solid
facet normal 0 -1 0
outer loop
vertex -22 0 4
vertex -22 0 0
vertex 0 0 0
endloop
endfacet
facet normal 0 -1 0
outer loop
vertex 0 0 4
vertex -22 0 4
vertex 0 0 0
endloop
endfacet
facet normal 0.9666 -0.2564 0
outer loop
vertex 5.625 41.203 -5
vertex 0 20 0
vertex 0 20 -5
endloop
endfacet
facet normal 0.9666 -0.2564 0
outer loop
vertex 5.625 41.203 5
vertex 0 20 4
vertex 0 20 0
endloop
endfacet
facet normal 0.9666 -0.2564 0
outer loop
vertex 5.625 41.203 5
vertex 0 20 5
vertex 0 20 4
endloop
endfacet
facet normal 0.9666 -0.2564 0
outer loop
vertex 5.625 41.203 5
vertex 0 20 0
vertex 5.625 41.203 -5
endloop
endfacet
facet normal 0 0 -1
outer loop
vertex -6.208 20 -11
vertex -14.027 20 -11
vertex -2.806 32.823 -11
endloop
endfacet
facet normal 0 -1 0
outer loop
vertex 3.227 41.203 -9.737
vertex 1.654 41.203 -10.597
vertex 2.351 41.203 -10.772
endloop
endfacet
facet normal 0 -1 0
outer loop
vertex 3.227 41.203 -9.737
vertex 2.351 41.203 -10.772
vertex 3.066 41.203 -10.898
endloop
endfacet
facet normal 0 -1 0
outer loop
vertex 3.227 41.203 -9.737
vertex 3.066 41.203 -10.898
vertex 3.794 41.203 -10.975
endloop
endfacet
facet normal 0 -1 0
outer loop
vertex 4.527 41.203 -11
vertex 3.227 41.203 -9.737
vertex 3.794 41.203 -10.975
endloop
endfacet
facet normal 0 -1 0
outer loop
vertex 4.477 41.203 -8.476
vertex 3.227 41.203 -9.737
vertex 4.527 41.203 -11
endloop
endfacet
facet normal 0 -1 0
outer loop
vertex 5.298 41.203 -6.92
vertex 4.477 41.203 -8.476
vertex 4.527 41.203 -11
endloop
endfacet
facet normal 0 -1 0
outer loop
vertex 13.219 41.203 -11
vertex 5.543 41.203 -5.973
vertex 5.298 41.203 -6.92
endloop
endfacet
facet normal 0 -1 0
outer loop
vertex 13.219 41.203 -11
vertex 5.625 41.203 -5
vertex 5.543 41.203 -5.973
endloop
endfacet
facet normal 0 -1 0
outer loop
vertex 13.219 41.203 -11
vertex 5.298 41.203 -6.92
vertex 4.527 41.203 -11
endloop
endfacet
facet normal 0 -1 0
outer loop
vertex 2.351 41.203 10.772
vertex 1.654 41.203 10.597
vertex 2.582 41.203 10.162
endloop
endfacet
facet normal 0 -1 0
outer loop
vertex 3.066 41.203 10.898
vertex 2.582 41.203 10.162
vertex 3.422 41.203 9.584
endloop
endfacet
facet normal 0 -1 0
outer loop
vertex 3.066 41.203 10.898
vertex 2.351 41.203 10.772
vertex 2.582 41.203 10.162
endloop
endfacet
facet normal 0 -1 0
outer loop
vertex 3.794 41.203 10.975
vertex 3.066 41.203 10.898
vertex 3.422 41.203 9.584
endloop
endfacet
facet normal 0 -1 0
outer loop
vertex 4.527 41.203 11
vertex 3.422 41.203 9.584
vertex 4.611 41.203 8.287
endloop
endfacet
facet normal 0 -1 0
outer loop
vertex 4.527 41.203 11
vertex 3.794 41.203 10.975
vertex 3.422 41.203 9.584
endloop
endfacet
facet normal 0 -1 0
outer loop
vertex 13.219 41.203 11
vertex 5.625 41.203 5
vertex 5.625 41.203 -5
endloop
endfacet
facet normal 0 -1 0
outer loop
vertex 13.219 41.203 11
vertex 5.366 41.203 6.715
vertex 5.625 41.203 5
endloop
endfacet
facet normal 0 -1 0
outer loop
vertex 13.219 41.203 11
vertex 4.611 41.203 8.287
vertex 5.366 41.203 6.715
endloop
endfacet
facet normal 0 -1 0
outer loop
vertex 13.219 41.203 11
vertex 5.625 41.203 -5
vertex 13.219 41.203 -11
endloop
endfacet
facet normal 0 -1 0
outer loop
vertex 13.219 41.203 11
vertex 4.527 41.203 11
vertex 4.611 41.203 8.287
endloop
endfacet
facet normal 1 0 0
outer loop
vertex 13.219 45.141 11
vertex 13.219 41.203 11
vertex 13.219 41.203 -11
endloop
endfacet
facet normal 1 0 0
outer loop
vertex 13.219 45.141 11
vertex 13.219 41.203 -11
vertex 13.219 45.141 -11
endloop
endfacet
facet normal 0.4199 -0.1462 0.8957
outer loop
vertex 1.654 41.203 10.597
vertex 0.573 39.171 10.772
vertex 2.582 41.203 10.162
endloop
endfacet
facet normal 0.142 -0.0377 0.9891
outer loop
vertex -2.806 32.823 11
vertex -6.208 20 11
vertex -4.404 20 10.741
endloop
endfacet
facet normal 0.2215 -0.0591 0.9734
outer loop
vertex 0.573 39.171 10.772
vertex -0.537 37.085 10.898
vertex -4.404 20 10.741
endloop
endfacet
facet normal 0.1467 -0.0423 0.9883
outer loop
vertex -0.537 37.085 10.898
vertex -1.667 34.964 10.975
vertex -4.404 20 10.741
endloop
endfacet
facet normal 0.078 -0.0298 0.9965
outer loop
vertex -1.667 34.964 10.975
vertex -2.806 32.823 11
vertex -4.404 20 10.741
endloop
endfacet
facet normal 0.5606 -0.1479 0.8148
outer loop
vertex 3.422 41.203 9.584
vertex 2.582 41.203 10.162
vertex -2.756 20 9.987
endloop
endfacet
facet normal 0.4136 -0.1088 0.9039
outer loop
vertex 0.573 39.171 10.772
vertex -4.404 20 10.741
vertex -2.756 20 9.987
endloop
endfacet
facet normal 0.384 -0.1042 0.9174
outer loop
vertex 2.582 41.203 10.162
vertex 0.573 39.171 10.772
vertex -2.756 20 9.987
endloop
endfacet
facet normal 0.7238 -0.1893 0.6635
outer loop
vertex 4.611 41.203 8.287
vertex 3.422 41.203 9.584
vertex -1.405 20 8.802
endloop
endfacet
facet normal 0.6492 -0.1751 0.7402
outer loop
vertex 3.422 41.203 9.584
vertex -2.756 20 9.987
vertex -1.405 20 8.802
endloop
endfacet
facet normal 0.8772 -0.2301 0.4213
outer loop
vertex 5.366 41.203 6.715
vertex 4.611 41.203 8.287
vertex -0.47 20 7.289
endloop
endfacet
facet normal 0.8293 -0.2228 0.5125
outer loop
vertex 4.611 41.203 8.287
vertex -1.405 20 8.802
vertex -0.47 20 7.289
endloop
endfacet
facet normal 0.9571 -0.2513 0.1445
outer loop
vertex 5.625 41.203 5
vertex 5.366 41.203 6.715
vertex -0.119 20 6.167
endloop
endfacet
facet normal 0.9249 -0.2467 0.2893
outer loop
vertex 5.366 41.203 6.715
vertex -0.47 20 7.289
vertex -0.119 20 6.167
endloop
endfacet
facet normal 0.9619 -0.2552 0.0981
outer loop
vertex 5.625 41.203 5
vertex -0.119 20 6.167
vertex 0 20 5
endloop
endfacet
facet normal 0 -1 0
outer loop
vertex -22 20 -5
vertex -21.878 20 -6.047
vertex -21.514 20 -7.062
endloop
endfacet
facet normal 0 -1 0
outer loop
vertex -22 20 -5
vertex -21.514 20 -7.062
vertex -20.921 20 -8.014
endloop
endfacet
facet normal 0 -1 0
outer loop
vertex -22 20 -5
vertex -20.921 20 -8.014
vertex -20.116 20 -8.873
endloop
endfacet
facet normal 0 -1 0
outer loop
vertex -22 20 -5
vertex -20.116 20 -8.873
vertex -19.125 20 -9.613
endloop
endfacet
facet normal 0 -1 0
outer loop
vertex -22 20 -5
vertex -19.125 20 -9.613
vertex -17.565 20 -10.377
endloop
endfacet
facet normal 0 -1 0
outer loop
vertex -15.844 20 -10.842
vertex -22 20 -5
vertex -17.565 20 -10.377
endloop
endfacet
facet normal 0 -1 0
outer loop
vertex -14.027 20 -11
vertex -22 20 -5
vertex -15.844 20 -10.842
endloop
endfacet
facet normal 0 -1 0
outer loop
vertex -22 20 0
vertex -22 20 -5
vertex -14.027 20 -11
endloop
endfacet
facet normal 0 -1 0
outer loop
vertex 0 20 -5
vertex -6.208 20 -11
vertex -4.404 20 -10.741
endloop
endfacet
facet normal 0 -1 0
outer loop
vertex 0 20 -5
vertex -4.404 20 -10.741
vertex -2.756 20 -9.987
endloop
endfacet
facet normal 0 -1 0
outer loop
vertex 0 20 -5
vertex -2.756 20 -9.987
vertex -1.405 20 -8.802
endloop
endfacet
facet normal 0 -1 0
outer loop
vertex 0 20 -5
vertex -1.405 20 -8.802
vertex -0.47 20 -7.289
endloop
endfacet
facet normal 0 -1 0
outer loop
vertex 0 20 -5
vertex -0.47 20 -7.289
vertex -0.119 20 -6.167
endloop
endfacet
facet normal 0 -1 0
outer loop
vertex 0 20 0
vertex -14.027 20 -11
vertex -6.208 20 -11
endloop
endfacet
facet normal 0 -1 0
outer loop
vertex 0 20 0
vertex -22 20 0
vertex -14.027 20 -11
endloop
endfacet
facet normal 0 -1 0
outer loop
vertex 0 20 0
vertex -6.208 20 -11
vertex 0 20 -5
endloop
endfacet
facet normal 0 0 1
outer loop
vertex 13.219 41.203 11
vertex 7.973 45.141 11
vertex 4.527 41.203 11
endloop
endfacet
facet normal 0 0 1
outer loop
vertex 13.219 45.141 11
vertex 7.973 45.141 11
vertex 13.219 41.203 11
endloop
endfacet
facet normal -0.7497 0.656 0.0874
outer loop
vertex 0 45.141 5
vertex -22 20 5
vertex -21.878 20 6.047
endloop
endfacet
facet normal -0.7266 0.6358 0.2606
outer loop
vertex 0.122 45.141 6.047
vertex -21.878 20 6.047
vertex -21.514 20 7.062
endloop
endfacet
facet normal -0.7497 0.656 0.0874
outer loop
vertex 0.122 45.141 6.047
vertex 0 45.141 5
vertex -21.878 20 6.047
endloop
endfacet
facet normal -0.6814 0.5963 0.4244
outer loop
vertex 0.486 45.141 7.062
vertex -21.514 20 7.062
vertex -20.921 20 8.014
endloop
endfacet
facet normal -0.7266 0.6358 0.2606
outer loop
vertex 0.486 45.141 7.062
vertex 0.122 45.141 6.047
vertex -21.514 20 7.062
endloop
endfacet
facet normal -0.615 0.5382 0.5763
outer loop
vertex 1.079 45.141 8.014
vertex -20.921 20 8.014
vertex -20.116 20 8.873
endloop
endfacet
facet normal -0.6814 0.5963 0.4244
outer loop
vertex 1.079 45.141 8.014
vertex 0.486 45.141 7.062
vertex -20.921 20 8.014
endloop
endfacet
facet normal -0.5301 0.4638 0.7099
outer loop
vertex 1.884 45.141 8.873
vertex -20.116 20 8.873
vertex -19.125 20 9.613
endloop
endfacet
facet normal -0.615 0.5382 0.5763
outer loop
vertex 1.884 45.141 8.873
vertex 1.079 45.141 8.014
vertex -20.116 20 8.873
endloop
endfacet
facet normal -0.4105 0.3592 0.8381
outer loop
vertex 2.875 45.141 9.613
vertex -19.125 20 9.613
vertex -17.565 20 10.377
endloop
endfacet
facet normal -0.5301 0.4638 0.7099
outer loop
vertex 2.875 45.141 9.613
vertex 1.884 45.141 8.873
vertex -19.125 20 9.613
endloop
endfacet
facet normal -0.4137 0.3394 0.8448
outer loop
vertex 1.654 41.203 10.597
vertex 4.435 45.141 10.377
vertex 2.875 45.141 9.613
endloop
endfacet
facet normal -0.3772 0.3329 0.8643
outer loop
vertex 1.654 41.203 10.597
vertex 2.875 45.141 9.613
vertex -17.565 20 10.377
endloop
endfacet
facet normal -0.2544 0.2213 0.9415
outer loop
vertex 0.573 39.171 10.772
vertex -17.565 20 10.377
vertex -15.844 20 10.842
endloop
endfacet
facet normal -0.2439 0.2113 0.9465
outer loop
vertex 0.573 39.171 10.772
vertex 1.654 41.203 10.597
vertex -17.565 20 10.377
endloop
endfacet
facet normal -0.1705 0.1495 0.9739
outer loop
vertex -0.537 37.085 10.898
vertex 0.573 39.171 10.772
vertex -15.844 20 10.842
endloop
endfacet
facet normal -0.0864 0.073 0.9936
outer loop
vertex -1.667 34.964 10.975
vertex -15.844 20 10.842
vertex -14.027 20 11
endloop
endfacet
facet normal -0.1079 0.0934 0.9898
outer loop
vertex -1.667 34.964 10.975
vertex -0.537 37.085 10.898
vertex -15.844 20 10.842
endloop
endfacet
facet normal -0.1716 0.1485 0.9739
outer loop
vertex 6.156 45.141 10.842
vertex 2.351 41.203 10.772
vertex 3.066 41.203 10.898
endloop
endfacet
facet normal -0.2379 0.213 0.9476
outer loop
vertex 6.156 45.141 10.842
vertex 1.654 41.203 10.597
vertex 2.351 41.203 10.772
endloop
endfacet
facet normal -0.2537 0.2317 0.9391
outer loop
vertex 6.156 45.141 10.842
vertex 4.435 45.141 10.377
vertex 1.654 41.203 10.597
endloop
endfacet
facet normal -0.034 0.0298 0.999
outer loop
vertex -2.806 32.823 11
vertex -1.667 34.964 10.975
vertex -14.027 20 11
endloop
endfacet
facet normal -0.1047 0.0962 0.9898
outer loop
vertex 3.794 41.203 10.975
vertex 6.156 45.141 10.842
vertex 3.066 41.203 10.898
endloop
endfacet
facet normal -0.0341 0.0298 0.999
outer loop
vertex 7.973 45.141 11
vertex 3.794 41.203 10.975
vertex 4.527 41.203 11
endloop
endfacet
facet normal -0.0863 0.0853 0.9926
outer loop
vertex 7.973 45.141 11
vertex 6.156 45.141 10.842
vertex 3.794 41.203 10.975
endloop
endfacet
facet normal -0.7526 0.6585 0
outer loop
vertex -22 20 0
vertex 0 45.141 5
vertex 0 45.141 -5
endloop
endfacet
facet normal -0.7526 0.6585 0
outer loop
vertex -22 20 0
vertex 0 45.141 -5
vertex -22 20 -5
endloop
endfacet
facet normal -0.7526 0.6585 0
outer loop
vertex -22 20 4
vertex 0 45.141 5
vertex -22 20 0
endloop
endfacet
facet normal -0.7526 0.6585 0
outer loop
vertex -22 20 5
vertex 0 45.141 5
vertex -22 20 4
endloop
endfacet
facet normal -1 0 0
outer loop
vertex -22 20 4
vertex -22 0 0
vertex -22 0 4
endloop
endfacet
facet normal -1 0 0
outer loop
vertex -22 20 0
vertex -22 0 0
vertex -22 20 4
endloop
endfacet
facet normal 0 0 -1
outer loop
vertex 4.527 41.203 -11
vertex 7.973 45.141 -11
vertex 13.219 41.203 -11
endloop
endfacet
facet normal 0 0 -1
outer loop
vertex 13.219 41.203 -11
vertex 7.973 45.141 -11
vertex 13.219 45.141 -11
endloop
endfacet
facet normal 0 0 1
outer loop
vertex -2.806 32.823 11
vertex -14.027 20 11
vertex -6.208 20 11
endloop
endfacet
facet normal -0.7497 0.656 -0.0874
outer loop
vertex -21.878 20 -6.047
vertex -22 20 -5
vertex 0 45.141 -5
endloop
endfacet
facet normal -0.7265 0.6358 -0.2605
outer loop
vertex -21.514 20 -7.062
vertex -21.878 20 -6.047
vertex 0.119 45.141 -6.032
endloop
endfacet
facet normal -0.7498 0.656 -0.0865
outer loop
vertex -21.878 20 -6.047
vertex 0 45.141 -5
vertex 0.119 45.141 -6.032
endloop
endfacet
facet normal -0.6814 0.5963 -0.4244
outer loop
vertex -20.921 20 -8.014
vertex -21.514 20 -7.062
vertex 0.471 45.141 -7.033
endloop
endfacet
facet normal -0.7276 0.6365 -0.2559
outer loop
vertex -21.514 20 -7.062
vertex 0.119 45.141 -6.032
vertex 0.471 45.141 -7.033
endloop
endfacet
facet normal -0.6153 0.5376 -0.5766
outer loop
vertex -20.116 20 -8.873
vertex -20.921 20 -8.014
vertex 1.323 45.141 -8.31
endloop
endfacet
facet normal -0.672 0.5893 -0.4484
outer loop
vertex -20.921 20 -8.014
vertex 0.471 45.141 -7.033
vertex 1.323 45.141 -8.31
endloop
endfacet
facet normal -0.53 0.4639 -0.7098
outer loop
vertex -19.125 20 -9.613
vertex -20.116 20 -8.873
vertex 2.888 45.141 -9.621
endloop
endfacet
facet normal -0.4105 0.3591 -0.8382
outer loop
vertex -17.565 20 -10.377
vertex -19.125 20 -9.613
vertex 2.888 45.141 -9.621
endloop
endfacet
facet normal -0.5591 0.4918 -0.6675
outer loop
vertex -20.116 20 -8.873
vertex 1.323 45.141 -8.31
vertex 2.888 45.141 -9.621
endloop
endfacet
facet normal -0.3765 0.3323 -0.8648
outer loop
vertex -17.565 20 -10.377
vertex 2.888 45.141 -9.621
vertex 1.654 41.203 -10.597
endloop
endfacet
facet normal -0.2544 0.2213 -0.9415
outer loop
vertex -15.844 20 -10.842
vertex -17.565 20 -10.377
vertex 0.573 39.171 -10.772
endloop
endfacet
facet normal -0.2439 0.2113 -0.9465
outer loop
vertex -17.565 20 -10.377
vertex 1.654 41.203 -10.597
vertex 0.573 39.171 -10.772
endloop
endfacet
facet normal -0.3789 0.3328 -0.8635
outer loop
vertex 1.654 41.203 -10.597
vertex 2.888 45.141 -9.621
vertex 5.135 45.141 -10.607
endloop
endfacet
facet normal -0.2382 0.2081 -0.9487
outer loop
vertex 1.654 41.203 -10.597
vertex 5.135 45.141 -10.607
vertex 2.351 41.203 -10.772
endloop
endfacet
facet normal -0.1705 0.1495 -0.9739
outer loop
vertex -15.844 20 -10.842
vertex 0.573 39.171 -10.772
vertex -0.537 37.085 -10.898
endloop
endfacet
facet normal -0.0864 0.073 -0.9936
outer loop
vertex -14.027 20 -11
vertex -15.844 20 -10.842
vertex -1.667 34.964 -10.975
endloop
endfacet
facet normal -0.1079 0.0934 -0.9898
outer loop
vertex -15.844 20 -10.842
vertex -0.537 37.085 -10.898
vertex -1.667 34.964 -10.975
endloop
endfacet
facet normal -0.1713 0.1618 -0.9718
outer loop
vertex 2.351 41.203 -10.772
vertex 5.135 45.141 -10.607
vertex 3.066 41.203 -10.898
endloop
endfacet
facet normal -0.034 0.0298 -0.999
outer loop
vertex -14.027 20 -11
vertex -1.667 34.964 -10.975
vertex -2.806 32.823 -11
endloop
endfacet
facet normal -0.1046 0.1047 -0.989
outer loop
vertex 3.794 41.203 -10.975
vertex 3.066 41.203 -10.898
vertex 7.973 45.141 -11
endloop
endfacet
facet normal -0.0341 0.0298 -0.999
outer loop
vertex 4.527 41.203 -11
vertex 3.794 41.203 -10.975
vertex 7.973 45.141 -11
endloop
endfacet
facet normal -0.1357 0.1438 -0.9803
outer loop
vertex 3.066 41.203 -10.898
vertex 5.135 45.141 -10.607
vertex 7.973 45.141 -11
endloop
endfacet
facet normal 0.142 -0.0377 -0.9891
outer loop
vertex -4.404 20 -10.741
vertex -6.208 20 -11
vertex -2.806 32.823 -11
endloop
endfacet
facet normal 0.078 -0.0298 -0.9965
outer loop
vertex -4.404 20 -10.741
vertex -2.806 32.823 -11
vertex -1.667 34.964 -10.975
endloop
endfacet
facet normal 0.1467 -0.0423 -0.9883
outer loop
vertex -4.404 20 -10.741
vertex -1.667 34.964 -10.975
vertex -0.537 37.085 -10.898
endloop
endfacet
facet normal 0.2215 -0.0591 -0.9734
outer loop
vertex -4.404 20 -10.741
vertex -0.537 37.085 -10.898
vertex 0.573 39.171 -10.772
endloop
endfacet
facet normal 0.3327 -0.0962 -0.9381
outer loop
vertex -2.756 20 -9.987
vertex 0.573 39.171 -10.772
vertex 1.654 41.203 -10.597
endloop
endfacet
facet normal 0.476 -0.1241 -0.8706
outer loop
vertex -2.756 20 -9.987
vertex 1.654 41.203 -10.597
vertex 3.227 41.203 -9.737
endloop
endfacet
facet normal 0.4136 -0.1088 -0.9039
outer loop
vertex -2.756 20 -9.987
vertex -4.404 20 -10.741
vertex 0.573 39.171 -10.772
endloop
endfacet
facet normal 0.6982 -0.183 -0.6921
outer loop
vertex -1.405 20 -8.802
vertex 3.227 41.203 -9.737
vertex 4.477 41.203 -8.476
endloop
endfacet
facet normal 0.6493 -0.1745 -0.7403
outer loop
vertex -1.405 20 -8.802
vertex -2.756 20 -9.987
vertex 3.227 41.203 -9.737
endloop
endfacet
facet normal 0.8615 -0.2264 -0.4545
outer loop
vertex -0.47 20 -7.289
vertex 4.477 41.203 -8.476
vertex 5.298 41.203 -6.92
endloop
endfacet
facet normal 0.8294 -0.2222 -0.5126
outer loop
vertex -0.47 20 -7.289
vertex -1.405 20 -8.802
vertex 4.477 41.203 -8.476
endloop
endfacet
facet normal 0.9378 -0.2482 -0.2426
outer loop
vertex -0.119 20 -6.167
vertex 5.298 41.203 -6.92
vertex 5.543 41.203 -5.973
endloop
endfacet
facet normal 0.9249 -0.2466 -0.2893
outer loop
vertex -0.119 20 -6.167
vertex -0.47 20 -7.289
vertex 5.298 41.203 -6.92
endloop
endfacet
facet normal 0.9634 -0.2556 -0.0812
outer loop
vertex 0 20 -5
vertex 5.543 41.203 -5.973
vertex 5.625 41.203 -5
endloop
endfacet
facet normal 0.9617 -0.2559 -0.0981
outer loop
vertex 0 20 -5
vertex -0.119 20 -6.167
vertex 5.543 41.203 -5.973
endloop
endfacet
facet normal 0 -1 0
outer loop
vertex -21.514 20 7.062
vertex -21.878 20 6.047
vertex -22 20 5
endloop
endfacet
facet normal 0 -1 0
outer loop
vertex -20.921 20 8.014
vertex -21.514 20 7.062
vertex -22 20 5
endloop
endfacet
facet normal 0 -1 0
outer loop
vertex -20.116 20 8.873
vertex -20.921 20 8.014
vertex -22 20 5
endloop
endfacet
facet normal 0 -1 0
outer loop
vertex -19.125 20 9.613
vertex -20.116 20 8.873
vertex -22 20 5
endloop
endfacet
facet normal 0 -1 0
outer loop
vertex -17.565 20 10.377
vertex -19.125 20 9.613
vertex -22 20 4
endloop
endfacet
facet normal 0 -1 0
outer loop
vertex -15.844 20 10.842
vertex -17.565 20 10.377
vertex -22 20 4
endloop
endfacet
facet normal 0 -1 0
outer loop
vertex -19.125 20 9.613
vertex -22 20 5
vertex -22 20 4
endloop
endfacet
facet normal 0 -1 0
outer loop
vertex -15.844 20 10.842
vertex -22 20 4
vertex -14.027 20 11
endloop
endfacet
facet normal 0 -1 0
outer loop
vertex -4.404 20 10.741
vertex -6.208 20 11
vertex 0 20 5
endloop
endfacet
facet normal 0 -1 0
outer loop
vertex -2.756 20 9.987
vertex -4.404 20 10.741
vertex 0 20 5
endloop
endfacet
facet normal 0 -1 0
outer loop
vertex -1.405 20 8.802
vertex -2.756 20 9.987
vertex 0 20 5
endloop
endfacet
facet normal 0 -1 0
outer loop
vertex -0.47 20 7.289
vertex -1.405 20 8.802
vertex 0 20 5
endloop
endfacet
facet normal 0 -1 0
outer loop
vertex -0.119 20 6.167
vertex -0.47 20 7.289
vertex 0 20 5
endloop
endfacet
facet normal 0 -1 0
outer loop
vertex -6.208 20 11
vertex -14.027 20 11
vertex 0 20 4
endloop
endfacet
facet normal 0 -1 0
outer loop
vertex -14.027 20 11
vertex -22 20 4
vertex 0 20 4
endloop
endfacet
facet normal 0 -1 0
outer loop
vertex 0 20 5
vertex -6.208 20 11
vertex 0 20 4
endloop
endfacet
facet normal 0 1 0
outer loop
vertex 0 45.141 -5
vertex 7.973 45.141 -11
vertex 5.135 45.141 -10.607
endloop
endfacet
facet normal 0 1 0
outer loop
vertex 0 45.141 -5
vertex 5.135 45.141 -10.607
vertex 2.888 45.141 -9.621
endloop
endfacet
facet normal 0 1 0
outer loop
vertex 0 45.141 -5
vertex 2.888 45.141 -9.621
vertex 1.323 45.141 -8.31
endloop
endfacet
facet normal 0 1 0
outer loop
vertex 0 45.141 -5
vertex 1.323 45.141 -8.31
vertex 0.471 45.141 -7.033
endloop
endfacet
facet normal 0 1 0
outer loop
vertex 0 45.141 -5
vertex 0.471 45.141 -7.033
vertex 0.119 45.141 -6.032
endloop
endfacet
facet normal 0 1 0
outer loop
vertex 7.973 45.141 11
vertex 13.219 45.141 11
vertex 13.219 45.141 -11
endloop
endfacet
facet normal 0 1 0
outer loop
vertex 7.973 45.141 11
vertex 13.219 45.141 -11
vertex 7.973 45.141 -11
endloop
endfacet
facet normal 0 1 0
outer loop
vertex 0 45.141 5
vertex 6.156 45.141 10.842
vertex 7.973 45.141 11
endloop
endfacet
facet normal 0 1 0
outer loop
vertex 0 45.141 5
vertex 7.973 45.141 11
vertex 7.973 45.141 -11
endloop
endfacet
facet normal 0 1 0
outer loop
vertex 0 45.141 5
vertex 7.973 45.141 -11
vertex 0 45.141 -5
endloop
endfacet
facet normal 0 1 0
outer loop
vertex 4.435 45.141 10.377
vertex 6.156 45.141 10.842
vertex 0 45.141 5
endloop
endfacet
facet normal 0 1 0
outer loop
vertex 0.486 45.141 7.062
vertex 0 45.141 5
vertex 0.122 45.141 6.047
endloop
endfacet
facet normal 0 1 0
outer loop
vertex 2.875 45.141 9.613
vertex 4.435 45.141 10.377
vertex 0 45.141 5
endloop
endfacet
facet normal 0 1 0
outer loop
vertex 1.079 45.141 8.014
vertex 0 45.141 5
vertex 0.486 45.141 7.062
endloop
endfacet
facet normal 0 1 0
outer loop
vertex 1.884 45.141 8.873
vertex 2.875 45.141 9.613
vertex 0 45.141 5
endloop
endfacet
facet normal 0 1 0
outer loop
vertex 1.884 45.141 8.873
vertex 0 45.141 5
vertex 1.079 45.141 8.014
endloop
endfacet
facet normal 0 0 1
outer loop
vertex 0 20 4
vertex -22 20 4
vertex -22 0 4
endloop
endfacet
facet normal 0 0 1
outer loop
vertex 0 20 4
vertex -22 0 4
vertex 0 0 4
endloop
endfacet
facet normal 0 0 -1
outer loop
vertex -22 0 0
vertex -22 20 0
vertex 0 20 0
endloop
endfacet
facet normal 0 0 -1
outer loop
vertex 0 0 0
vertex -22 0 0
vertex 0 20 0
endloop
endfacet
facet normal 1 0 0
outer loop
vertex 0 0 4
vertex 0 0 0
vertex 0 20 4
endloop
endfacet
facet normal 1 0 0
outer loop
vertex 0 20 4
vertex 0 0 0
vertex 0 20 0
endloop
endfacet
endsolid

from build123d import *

# Parameters (mm, degrees)
F0_W         = 22
F0_H         = 20
F1_DEPTH     = 4
F2_DEPTH     = 11
F3_DEPTH     = 11
F4_T1_DEPTH  = 63.4073519566
F4_T6_DEPTH  = 51.9365723987
F4_T11_DEPTH = 51.9365723987


# Not quite as in the source:
# - a fillet or chamfer that OpenCascade refuses, or shapes differently, is made with other operations: its cross-section is extruded or revolved along the edge and cut away or added


with BuildPart() as f1:
    # F0 (on Top) → F1 (new body)
    with BuildSketch(Plane.XY):
        with Locations((-11, 10)):
            Rectangle(F0_W, F0_H)
    extrude(amount=F1_DEPTH)

    # F0 (on Top) → F2 (join)
    with BuildSketch(Plane.XY):
        Polygon((-22, 20), (0, 20), (5.6250016205, 41.2031263113), (13.2187530398, 41.2031263113), (13.2187530398, 45.1406277716), (0, 45.1406277716), align=None)
    extrude(amount=F2_DEPTH)

    # F0 (on Top) → F3 (join)
    with BuildSketch(Plane.XY):
        Polygon((-22, 20), (0, 20), (5.6250016205, 41.2031263113), (13.2187530398, 41.2031263113), (13.2187530398, 45.1406277716), (0, 45.1406277716), align=None)
    extrude(amount=-F3_DEPTH)

    # F4: fillet of radius 6 on 4 edges, made by hand

    # F4_s2 → F4_t1 (cut)
    with BuildSketch(Plane(origin=(32.2489050023, 36.8526234865, 0), x_dir=(0, 0, 1), z_dir=(-0.6585376784, -0.7525477567, 0))):
        with BuildLine():
            ThreePointArc((-5, 29.7268042156), (-9.2426406871, 27.9694449027), (-11, 23.7268042156))
            Line((-11, 23.7268042156), (-11, 29.7268042156))
            Line((-11, 29.7268042156), (-5, 29.7268042156))
        make_face()
        with BuildLine():
            ThreePointArc((5, 29.7268042156), (9.2426406871, 27.9694449027), (11, 23.7268042156))
            Line((11, 23.7268042156), (11, 29.7268042156))
            Line((11, 29.7268042156), (5, 29.7268042156))
        make_face()
    extrude(amount=F4_T1_DEPTH, mode=Mode.SUBTRACT)


with BuildPart() as f4_tool4:
    # F4_s5 → F4_t6 (new body)
    with BuildSketch(Plane(origin=(1.1106377761, 4.1864864479, 0), x_dir=(0, 0, 1), z_dir=(0.2564211727, 0.9665651464, 0))):
        with BuildLine():
            ThreePointArc((-11, -11.1284234549), (-9.2426406871, -6.8857827678), (-5, -5.1284234549))
            Line((-5, -5.1284234549), (-11, -5.1284234549))
            Line((-11, -5.1284234549), (-11, -11.1284234549))
        make_face()
    extrude(amount=F4_T6_DEPTH)

    split(bisect_by=Plane.XZ.offset(-41.2031263113), keep=Keep.TOP)


with BuildPart() as f1_1:
    add(f1.part)

    # F4_t3: cut F4_tool4
    add(f4_tool4.part, mode=Mode.SUBTRACT)


with BuildPart() as f4_tool9:
    # F4_s10 → F4_t11 (new body)
    with BuildSketch(Plane(origin=(1.1106377761, 4.1864864479, 0), x_dir=(0, 0, 1), z_dir=(0.2564211727, 0.9665651464, 0))):
        with BuildLine():
            ThreePointArc((11, -11.1284234549), (9.2426406871, -6.8857827678), (5, -5.1284234549))
            Line((5, -5.1284234549), (11, -5.1284234549))
            Line((11, -5.1284234549), (11, -11.1284234549))
        make_face()
    extrude(amount=F4_T11_DEPTH)

    split(bisect_by=Plane.XZ.offset(-41.2031263113), keep=Keep.TOP)


with BuildPart() as f1_2:
    add(f1_1.part)

    # F4_t8: cut F4_tool9
    add(f4_tool9.part, mode=Mode.SUBTRACT)


solid = f1_2.part
